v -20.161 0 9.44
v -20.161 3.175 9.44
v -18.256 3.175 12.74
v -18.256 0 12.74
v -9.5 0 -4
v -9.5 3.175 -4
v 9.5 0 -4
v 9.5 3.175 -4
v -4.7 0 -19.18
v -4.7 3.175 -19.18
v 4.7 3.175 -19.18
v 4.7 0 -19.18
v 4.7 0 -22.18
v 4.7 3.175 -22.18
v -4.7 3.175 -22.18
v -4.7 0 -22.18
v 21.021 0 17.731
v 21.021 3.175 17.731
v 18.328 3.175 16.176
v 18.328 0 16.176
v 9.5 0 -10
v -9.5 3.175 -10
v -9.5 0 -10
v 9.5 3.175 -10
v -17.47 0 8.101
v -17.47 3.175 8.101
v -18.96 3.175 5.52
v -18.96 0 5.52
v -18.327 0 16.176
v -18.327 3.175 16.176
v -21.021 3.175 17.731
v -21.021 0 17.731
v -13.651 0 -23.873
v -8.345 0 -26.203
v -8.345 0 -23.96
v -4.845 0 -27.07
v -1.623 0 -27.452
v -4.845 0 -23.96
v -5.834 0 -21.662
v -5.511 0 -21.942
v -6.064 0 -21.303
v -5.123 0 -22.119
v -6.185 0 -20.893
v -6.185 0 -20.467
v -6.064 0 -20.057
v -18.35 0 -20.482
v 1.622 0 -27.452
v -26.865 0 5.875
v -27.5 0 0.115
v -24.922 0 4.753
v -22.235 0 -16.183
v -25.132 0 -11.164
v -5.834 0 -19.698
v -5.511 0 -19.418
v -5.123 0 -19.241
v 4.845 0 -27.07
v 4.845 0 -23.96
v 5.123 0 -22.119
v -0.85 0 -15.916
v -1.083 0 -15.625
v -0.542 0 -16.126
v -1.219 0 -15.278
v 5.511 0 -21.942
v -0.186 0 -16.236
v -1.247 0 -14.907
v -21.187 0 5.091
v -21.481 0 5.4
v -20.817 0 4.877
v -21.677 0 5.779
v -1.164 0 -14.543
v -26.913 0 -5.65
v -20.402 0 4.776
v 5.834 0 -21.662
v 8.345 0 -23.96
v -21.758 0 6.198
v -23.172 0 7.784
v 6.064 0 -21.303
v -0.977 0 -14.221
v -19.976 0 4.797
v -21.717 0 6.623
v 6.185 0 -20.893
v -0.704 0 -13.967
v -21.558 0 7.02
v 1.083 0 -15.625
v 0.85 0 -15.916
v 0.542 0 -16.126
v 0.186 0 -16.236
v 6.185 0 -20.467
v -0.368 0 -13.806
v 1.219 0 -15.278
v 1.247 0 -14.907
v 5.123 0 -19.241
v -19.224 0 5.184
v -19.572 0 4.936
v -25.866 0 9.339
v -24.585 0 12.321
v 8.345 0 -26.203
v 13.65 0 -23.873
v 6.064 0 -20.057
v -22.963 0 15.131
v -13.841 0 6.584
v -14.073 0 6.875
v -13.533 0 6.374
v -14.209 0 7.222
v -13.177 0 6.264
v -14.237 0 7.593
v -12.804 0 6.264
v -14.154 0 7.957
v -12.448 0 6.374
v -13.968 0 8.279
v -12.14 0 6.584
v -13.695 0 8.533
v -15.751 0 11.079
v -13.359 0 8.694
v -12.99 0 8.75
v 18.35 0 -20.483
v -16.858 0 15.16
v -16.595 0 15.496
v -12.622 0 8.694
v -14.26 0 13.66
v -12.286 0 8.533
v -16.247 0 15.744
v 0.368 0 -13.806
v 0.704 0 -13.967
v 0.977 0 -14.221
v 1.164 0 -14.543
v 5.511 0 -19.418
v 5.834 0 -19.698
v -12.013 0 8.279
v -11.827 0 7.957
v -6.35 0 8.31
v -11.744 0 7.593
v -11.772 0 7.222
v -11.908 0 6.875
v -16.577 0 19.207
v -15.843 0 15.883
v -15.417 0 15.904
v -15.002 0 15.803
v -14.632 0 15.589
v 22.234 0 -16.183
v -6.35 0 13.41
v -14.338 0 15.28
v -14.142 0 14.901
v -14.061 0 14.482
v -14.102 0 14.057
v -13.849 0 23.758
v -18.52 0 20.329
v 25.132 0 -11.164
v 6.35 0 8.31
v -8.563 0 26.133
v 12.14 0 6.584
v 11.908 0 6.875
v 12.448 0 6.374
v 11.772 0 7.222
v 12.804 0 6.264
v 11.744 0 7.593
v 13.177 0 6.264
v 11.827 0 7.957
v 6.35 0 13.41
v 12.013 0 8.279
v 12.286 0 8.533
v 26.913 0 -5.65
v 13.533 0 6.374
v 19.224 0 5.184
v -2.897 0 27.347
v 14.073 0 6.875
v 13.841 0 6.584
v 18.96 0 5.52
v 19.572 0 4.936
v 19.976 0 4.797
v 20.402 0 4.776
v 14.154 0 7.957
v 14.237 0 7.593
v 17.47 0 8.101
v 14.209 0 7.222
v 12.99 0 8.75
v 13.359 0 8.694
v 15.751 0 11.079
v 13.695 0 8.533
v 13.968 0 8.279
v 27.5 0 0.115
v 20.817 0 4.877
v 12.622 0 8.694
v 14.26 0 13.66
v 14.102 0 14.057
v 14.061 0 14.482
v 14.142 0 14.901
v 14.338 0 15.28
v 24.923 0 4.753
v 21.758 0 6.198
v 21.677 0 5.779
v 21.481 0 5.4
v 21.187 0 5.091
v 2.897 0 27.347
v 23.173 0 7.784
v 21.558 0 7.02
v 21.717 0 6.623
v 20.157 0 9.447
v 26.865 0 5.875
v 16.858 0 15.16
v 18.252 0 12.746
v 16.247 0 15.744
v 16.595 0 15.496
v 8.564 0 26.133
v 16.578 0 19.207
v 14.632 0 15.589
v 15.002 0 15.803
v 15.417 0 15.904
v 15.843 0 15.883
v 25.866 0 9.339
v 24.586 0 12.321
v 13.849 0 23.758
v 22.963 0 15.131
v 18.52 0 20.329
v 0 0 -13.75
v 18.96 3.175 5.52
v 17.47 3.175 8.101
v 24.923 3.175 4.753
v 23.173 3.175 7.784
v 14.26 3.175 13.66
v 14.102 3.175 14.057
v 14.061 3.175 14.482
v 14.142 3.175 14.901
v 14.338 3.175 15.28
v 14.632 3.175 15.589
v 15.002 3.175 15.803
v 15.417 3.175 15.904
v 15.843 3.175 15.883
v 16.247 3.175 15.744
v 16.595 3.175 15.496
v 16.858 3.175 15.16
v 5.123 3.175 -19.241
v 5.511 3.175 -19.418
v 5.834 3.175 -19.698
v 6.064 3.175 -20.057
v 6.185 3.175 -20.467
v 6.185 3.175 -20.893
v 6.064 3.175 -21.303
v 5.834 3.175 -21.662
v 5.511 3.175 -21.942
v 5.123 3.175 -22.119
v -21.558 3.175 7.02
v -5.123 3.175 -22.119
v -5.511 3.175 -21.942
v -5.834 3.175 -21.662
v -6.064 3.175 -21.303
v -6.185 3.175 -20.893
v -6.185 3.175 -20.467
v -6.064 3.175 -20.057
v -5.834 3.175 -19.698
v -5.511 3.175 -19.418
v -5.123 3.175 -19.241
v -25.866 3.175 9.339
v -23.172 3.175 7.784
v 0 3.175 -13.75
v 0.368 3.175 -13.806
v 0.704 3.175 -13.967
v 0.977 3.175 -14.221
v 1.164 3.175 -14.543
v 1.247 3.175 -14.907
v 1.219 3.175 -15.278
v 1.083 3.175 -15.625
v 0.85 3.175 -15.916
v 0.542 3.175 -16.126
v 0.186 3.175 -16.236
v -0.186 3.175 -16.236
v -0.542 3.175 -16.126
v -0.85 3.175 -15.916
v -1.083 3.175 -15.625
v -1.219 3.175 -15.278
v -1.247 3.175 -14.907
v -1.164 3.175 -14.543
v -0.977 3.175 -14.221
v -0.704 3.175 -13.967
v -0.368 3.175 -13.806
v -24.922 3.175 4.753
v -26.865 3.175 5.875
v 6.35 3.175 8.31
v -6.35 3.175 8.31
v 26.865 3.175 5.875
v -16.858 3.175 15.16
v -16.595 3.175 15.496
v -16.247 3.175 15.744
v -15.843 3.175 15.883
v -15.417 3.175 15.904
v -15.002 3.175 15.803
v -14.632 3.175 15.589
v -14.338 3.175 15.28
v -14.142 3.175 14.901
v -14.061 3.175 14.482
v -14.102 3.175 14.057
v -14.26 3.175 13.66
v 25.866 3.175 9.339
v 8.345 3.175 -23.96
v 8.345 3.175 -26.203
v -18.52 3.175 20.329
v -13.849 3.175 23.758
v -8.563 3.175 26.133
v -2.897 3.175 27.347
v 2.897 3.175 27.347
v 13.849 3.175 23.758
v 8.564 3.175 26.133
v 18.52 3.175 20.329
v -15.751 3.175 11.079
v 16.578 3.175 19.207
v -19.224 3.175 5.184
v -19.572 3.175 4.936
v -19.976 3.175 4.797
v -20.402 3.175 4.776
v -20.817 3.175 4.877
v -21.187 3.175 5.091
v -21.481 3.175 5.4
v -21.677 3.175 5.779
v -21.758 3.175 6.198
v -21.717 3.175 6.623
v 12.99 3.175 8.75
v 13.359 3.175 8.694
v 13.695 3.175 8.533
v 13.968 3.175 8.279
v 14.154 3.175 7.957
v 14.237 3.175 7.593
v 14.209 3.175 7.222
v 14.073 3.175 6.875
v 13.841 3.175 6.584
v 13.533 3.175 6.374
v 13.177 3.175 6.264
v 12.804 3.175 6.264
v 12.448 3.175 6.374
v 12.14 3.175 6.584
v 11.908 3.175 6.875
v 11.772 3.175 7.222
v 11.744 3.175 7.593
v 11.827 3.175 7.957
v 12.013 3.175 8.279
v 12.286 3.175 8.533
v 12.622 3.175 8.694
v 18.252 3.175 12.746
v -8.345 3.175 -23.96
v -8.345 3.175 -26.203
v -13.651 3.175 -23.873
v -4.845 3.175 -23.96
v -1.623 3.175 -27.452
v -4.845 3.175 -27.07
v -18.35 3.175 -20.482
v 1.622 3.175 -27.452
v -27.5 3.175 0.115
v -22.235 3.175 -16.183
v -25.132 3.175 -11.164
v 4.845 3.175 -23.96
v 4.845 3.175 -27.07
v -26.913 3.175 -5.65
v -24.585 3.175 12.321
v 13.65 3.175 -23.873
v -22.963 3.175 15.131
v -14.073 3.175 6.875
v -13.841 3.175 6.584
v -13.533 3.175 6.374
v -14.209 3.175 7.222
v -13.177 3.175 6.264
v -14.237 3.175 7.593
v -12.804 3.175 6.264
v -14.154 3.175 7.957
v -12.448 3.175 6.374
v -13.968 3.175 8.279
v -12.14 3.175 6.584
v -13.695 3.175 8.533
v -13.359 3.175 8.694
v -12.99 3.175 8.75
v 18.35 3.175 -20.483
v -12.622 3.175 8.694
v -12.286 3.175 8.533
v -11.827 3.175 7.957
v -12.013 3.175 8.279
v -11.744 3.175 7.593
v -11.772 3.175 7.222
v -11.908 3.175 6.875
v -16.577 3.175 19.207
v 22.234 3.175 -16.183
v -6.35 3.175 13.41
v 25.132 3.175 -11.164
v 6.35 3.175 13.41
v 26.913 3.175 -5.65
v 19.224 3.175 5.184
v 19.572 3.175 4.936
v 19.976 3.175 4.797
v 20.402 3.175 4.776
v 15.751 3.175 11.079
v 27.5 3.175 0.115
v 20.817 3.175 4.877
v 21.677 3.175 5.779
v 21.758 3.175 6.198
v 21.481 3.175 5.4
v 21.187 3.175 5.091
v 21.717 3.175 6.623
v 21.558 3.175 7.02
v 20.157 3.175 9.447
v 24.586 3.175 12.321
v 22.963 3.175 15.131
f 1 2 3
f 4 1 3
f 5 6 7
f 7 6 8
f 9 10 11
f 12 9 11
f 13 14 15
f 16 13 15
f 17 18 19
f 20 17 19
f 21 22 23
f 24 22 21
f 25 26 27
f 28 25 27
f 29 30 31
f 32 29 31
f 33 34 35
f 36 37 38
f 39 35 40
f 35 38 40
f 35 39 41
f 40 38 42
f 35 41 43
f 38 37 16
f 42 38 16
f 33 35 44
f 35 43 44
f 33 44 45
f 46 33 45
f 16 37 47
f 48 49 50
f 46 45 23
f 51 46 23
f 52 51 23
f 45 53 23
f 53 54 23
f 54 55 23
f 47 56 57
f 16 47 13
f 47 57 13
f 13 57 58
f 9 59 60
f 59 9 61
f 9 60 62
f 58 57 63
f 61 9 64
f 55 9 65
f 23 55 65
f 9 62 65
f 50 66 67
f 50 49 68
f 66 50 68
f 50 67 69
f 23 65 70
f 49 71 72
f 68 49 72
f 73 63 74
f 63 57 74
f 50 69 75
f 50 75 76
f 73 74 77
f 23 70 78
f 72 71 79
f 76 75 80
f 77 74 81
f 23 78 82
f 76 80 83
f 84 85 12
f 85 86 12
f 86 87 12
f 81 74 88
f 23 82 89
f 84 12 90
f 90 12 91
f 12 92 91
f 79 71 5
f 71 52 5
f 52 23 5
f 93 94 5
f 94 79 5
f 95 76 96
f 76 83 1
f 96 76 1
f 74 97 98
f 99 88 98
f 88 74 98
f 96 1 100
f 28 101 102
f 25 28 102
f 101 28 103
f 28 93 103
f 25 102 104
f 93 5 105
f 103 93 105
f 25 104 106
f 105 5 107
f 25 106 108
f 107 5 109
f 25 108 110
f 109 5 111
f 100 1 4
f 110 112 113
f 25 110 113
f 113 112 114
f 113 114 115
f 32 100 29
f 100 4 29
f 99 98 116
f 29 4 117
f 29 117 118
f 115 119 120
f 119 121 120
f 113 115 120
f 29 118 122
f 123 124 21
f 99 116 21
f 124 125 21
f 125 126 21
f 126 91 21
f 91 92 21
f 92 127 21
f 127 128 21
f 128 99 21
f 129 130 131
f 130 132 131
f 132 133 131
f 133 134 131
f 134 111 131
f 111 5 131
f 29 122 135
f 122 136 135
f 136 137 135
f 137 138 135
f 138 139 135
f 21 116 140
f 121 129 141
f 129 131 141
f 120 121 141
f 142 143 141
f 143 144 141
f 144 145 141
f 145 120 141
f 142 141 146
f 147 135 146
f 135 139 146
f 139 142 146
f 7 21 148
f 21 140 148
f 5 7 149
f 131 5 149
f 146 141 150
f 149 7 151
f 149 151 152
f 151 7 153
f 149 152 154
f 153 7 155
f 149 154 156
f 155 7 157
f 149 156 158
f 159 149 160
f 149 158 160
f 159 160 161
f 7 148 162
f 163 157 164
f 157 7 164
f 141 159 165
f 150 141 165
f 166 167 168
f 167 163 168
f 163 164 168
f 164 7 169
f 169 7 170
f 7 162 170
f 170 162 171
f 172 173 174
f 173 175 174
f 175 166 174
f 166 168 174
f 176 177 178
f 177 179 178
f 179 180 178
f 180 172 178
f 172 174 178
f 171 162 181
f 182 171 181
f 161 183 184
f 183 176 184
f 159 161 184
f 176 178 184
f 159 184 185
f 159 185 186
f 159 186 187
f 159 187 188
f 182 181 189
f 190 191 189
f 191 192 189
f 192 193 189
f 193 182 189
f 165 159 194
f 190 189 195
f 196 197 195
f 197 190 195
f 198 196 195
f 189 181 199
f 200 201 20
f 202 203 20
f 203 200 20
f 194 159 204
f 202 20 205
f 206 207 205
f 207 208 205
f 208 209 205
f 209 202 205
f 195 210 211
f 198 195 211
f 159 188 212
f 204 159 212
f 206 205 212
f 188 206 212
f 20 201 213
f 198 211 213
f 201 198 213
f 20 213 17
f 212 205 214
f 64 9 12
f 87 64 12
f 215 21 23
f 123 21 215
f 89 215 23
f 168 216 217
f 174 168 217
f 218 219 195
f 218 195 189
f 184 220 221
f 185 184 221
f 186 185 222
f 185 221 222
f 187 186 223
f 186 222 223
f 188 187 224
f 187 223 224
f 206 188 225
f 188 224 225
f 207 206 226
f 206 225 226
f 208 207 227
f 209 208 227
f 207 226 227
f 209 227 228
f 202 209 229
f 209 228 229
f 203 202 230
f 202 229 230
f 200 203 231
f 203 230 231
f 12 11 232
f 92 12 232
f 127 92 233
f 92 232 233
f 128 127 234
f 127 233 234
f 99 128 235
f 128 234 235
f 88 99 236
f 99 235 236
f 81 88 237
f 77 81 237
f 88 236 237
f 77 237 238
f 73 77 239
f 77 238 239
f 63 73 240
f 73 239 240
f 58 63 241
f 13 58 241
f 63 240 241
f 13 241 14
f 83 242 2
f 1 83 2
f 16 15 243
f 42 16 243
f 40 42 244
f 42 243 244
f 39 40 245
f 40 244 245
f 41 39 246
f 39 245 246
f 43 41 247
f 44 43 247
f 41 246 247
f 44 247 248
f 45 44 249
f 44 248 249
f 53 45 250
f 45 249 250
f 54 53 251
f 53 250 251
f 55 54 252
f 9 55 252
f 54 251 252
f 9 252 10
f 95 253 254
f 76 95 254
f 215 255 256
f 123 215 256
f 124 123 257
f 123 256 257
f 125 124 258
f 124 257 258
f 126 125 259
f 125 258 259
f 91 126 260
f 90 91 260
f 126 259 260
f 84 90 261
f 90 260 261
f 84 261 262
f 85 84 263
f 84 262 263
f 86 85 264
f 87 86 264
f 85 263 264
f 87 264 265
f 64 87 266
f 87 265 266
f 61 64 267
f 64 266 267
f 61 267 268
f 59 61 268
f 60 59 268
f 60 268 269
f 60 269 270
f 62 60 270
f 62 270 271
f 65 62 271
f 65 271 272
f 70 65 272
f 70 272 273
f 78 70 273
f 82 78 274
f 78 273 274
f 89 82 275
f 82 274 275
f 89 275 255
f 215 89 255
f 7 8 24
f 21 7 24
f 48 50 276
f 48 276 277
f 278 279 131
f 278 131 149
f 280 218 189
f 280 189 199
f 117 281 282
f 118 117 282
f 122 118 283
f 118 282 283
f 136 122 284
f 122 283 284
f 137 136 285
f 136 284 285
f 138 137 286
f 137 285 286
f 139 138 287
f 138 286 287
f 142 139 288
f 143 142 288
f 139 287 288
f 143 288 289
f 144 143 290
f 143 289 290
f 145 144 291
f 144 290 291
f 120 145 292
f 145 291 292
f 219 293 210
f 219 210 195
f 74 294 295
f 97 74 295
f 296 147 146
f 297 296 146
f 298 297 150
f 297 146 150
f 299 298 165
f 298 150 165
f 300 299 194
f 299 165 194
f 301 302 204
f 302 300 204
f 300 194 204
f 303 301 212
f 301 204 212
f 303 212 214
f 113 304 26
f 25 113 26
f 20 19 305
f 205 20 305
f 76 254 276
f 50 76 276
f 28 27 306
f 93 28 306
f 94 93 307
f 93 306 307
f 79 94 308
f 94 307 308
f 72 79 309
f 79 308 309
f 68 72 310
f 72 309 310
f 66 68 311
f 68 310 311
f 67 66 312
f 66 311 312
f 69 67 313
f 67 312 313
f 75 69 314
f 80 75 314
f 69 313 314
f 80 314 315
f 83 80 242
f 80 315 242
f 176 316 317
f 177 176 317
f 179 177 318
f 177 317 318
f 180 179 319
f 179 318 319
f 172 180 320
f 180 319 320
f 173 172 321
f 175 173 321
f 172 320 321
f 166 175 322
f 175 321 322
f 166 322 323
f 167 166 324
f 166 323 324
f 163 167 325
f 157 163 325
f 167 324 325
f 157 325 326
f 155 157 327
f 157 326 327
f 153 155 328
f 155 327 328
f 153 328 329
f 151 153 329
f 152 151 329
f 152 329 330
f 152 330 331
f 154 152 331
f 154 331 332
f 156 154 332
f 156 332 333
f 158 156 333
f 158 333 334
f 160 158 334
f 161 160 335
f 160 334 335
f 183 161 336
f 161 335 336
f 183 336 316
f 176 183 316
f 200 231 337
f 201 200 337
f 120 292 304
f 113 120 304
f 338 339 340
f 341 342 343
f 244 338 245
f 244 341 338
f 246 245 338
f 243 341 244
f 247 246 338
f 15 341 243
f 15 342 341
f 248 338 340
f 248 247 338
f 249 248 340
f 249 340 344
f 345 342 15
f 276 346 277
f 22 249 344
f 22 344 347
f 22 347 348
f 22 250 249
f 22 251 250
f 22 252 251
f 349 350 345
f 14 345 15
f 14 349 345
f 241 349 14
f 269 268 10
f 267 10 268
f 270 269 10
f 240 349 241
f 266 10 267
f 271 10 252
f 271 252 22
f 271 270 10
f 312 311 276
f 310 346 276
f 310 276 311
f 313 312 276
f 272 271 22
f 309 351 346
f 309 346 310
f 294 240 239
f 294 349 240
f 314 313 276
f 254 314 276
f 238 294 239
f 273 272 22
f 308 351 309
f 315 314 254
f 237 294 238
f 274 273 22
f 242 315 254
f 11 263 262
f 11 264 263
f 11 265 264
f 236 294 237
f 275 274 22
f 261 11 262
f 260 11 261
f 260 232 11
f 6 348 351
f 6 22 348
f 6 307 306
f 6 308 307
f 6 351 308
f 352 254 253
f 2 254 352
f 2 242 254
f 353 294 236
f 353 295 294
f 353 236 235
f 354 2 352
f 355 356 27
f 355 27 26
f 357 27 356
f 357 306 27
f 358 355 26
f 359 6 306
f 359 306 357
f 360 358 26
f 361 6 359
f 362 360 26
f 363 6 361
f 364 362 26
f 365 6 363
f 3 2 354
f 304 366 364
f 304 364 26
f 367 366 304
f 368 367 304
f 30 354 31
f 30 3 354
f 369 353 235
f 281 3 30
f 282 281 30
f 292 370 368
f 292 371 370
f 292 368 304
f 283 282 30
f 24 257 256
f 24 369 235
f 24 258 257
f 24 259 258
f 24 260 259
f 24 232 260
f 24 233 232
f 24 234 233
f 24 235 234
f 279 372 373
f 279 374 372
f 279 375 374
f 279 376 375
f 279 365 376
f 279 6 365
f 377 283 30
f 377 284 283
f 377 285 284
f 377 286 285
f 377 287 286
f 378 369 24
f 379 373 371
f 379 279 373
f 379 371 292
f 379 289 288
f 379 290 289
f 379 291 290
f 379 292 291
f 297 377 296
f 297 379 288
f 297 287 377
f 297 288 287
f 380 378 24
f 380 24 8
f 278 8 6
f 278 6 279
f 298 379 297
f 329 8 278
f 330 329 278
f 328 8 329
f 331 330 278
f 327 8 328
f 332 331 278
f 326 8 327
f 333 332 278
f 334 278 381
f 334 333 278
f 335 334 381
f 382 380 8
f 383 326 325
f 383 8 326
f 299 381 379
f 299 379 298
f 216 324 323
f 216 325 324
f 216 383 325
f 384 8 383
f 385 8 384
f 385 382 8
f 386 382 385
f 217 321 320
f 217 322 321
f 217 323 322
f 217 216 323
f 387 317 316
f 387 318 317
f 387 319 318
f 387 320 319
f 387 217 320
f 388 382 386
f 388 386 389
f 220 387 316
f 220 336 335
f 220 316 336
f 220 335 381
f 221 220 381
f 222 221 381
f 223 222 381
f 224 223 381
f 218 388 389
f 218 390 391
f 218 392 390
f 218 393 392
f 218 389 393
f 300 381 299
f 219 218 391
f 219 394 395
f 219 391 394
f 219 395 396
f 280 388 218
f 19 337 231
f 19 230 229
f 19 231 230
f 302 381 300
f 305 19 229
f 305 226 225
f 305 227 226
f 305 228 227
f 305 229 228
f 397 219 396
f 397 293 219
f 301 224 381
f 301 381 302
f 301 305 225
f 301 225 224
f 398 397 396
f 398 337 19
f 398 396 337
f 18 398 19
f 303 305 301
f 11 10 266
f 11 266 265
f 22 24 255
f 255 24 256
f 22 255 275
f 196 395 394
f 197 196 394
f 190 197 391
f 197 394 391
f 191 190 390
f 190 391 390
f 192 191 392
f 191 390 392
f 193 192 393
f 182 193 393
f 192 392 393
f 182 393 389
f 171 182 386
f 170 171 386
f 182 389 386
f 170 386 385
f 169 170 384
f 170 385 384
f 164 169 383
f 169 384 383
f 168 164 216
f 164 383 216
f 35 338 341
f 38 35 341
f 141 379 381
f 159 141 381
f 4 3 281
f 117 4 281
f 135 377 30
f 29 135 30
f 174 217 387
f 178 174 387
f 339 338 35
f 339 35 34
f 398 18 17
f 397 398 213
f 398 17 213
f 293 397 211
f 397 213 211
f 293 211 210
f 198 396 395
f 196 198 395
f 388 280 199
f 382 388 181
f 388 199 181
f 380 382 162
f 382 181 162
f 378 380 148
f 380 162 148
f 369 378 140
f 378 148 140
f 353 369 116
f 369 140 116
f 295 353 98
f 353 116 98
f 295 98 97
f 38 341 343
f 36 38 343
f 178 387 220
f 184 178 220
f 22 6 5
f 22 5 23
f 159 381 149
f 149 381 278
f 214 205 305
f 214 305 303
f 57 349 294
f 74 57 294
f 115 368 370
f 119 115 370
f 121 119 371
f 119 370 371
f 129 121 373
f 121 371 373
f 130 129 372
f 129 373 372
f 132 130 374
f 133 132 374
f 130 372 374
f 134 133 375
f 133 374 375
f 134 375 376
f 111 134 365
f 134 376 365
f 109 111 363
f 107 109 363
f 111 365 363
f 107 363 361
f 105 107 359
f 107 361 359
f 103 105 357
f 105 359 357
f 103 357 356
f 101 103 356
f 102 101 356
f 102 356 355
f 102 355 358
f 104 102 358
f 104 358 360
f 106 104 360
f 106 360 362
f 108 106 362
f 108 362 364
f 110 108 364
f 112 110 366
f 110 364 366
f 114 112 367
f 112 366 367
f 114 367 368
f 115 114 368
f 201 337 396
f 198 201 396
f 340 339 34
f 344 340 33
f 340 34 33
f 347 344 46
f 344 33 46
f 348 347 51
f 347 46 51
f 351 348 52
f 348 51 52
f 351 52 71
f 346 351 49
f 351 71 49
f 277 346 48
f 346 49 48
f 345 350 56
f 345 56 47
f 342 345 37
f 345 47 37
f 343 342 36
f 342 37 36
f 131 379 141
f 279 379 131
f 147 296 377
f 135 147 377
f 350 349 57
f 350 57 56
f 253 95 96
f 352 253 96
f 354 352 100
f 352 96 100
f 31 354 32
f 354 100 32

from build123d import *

# Parameters (mm, degrees)
SKETCH2_R           = 27.5
BOSS_EXTRUDE1_DEPTH = 3.175
SKETCH3_R           = 1.5
SKETCH3_R_2         = 1.25
SKETCH3_W           = 3.81
SKETCH3_H           = 1.5
CUT_EXTRUDE1_DEPTH  = 3.175
SKETCH4_W           = 3.5
SKETCH4_H           = 4.54
CUT_EXTRUDE2_DEPTH  = 10
SKETCH5_W           = 19
SKETCH5_H           = 6
SKETCH5_W_2         = 12.7
SKETCH5_H_2         = 5.1
CUT_EXTRUDE3_DEPTH  = 10


with BuildPart() as part:
    # Sketch2 → Boss-Extrude1 (new body)
    with BuildSketch(Plane(origin=(0, 0, 0), x_dir=(1, 0, 0), z_dir=(0, 1, 0))):
        with Locations(Location((0, 0, 0), (0, 0, 270))):
            Circle(SKETCH2_R)
    extrude(amount=BOSS_EXTRUDE1_DEPTH)

    # Sketch3 → Cut-Extrude1 (cut)
    with BuildSketch(Plane(origin=(0, 3.175, 0), x_dir=(1, 0, 0), z_dir=(0, 1, 0))):
        with Locations((-4.7, 20.68)):
            Circle(SKETCH3_R)
        with Locations(Location((0, 15, 0), (0, 0, 270))):
            Circle(SKETCH3_R_2)
        with Locations(Location((-12.990381057, -7.5, 0), (0, 0, 270))):
            Circle(SKETCH3_R_2)
        with Locations(Location((12.990381057, -7.5, 0), (0, 0, 270))):
            Circle(SKETCH3_R_2)
        with BuildLine():
            Line((-1.90505, 20.68), (-1.90505, 22.18))
            Line((-1.90505, 22.18), (-4.7, 22.18))
            ThreePointArc((-4.7, 22.18), (-3.639339828, 21.740660172), (-3.2, 20.68))
            ThreePointArc((-3.2, 20.68), (-3.639339828, 19.619339828), (-4.7, 19.18))
            Line((-4.7, 19.18), (-1.174368952, 19.18))
            ThreePointArc((-1.174368952, 19.18), (-1.71266534, 19.845749619), (-1.90505, 20.68))
        make_face()
        with BuildLine():
            Line((1.90495, 20.68), (-1.90505, 20.68))
            ThreePointArc((-1.90505, 20.68), (-1.71266534, 19.845749619), (-1.174368952, 19.18))
            Line((-1.174368952, 19.18), (1.174268952, 19.18))
            ThreePointArc((1.174268952, 19.18), (1.71256534, 19.845749619), (1.90495, 20.68))
        make_face()
        with Locations((-5e-05, 21.43)):
            Rectangle(SKETCH3_W, SKETCH3_H)
        with BuildLine():
            Line((4.7, 22.18), (1.90495, 22.18))
            Line((1.90495, 22.18), (1.90495, 20.68))
            ThreePointArc((1.90495, 20.68), (1.71256534, 19.845749619), (1.174268952, 19.18))
            Line((1.174268952, 19.18), (4.7, 19.18))
            ThreePointArc((4.7, 19.18), (3.2, 20.68), (4.7, 22.18))
        make_face()
        with Locations((4.7, 20.68)):
            Circle(SKETCH3_R)
        with Locations((-15.55940535, -14.410319398)):
            Circle(SKETCH3_R)
        with BuildLine():
            ThreePointArc((-15.750561777, -11.079226754), (-16.027379451, -11.399040856), (-16.367944576, -11.649888379))
            Line((-16.367944576, -11.649888379), (-18.255879956, -12.739888379))
            Line((-18.255879956, -12.739888379), (-16.858443456, -15.160319398))
            ThreePointArc((-16.858443456, -15.160319398), (-16.30940535, -13.111281292), (-14.260367245, -13.660319398))
            Line((-14.260367245, -13.660319398), (-15.750561777, -11.079226754))
        make_face()
        Polygon((-18.255879956, -12.739888379), (-16.367944576, -11.649888379), (-18.272944576, -8.350331591), (-20.160879956, -9.440331591), align=None)
        with BuildLine():
            Line((-18.272944576, -8.350331591), (-16.367944576, -11.649888379))
            ThreePointArc((-16.367944576, -11.649888379), (-16.027379451, -11.399040856), (-15.750561777, -11.079226754))
            Line((-15.750561777, -11.079226754), (-17.470045712, -8.100993217))
            ThreePointArc((-17.470045712, -8.100993217), (-17.885421686, -8.180817303), (-18.272944576, -8.350331591))
        make_face()
        with BuildLine():
            Line((-20.160879956, -9.440331591), (-18.272944576, -8.350331591))
            ThreePointArc((-18.272944576, -8.350331591), (-17.885421686, -8.180817303), (-17.470045712, -8.100993217))
            Line((-17.470045712, -8.100993217), (-18.960367245, -5.519680602))
            ThreePointArc((-18.960367245, -5.519680602), (-18.810516611, -5.881452035), (-18.75940535, -6.269680602))
            ThreePointArc((-18.75940535, -6.269680602), (-19.871176783, -7.718569342), (-21.558443456, -7.019680602))
            Line((-21.558443456, -7.019680602), (-20.160879956, -9.440331591))
        make_face()
        with Locations((-20.25940535, -6.269680602)):
            Circle(SKETCH3_R)
        with BuildLine():
            ThreePointArc((17.470087928, -8.100920096), (17.888564549, -8.181681202), (18.278613112, -8.353457675))
            Line((18.278613112, -8.353457675), (20.157314831, -9.446506568))
            Line((20.157314831, -9.446506568), (21.558443456, -7.019680602))
            ThreePointArc((21.558443456, -7.019680602), (19.50940535, -7.568718708), (18.960367245, -5.519680602))
            Line((18.960367245, -5.519680602), (17.470087928, -8.100920096))
        make_face()
        Polygon((18.278613112, -8.353457675), (16.362606816, -11.646635452), (18.252304213, -12.746081749), (20.157314831, -9.446506568), align=None)
        with BuildLine():
            Line((18.252304213, -12.746081749), (16.362606816, -11.646635452))
            ThreePointArc((16.362606816, -11.646635452), (16.025165892, -11.396774761), (15.75065718, -11.079061511))
            Line((15.75065718, -11.079061511), (14.260367245, -13.660319398))
            ThreePointArc((14.260367245, -13.660319398), (15.947633918, -12.961430658), (17.05940535, -14.410319398))
            ThreePointArc((17.05940535, -14.410319398), (17.00829409, -14.798547965), (16.858443456, -15.160319398))
            Line((16.858443456, -15.160319398), (18.252304213, -12.746081749))
        make_face()
        with BuildLine():
            ThreePointArc((15.75065718, -11.079061511), (16.025165892, -11.396774761), (16.362606816, -11.646635452))
            Line((16.362606816, -11.646635452), (18.278613112, -8.353457675))
            ThreePointArc((18.278613112, -8.353457675), (17.888564549, -8.181681202), (17.470087928, -8.100920096))
            Line((17.470087928, -8.100920096), (15.75065718, -11.079061511))
        make_face()
        with Locations((15.55940535, -14.410319398)):
            Circle(SKETCH3_R)
        with Locations((20.25940535, -6.269680602)):
            Circle(SKETCH3_R)
    extrude(amount=-CUT_EXTRUDE1_DEPTH, mode=Mode.SUBTRACT)

    # Sketch4 → Cut-Extrude2 (cut)
    with BuildSketch(Plane(origin=(0, 3.175, 0), x_dir=(1, 0, 0), z_dir=(0, 1, 0))):
        Polygon((-27.104160508, -10.054216904), (-23.172405175, -7.784216904), (-24.922405175, -4.753127991), (-28.854160508, -7.023127991), align=None)
        Polygon((-22.259160508, -18.446003067), (-20.509160508, -21.47709198), (-16.577405175, -19.20709198), (-18.327405175, -16.176003067), align=None)
        with Locations((6.594873, 26.23)):
            Rectangle(SKETCH4_W, SKETCH4_H)
        with Locations((-6.595127, 26.23)):
            Rectangle(SKETCH4_W, SKETCH4_H)
        Polygon((22.259287508, -18.445783096), (18.327532175, -16.175783096), (16.577532175, -19.206872009), (20.509287508, -21.476872009), align=None)
        Polygon((27.104287508, -10.053996933), (23.172532175, -7.783996933), (24.922532175, -4.75290802), (28.854287508, -7.02290802), align=None)
    extrude(amount=-CUT_EXTRUDE2_DEPTH, mode=Mode.SUBTRACT)

    # Sketch5 → Cut-Extrude3 (cut)
    with BuildSketch(Plane(origin=(0, 3.175, 0), x_dir=(1, 0, 0), z_dir=(0, 1, 0))):
        with Locations((0, 7)):
            Rectangle(SKETCH5_W, SKETCH5_H)
        with Locations((0, -10.860319398)):
            Rectangle(SKETCH5_W_2, SKETCH5_H_2)
    extrude(amount=-CUT_EXTRUDE3_DEPTH, mode=Mode.SUBTRACT)


solid = part.part
